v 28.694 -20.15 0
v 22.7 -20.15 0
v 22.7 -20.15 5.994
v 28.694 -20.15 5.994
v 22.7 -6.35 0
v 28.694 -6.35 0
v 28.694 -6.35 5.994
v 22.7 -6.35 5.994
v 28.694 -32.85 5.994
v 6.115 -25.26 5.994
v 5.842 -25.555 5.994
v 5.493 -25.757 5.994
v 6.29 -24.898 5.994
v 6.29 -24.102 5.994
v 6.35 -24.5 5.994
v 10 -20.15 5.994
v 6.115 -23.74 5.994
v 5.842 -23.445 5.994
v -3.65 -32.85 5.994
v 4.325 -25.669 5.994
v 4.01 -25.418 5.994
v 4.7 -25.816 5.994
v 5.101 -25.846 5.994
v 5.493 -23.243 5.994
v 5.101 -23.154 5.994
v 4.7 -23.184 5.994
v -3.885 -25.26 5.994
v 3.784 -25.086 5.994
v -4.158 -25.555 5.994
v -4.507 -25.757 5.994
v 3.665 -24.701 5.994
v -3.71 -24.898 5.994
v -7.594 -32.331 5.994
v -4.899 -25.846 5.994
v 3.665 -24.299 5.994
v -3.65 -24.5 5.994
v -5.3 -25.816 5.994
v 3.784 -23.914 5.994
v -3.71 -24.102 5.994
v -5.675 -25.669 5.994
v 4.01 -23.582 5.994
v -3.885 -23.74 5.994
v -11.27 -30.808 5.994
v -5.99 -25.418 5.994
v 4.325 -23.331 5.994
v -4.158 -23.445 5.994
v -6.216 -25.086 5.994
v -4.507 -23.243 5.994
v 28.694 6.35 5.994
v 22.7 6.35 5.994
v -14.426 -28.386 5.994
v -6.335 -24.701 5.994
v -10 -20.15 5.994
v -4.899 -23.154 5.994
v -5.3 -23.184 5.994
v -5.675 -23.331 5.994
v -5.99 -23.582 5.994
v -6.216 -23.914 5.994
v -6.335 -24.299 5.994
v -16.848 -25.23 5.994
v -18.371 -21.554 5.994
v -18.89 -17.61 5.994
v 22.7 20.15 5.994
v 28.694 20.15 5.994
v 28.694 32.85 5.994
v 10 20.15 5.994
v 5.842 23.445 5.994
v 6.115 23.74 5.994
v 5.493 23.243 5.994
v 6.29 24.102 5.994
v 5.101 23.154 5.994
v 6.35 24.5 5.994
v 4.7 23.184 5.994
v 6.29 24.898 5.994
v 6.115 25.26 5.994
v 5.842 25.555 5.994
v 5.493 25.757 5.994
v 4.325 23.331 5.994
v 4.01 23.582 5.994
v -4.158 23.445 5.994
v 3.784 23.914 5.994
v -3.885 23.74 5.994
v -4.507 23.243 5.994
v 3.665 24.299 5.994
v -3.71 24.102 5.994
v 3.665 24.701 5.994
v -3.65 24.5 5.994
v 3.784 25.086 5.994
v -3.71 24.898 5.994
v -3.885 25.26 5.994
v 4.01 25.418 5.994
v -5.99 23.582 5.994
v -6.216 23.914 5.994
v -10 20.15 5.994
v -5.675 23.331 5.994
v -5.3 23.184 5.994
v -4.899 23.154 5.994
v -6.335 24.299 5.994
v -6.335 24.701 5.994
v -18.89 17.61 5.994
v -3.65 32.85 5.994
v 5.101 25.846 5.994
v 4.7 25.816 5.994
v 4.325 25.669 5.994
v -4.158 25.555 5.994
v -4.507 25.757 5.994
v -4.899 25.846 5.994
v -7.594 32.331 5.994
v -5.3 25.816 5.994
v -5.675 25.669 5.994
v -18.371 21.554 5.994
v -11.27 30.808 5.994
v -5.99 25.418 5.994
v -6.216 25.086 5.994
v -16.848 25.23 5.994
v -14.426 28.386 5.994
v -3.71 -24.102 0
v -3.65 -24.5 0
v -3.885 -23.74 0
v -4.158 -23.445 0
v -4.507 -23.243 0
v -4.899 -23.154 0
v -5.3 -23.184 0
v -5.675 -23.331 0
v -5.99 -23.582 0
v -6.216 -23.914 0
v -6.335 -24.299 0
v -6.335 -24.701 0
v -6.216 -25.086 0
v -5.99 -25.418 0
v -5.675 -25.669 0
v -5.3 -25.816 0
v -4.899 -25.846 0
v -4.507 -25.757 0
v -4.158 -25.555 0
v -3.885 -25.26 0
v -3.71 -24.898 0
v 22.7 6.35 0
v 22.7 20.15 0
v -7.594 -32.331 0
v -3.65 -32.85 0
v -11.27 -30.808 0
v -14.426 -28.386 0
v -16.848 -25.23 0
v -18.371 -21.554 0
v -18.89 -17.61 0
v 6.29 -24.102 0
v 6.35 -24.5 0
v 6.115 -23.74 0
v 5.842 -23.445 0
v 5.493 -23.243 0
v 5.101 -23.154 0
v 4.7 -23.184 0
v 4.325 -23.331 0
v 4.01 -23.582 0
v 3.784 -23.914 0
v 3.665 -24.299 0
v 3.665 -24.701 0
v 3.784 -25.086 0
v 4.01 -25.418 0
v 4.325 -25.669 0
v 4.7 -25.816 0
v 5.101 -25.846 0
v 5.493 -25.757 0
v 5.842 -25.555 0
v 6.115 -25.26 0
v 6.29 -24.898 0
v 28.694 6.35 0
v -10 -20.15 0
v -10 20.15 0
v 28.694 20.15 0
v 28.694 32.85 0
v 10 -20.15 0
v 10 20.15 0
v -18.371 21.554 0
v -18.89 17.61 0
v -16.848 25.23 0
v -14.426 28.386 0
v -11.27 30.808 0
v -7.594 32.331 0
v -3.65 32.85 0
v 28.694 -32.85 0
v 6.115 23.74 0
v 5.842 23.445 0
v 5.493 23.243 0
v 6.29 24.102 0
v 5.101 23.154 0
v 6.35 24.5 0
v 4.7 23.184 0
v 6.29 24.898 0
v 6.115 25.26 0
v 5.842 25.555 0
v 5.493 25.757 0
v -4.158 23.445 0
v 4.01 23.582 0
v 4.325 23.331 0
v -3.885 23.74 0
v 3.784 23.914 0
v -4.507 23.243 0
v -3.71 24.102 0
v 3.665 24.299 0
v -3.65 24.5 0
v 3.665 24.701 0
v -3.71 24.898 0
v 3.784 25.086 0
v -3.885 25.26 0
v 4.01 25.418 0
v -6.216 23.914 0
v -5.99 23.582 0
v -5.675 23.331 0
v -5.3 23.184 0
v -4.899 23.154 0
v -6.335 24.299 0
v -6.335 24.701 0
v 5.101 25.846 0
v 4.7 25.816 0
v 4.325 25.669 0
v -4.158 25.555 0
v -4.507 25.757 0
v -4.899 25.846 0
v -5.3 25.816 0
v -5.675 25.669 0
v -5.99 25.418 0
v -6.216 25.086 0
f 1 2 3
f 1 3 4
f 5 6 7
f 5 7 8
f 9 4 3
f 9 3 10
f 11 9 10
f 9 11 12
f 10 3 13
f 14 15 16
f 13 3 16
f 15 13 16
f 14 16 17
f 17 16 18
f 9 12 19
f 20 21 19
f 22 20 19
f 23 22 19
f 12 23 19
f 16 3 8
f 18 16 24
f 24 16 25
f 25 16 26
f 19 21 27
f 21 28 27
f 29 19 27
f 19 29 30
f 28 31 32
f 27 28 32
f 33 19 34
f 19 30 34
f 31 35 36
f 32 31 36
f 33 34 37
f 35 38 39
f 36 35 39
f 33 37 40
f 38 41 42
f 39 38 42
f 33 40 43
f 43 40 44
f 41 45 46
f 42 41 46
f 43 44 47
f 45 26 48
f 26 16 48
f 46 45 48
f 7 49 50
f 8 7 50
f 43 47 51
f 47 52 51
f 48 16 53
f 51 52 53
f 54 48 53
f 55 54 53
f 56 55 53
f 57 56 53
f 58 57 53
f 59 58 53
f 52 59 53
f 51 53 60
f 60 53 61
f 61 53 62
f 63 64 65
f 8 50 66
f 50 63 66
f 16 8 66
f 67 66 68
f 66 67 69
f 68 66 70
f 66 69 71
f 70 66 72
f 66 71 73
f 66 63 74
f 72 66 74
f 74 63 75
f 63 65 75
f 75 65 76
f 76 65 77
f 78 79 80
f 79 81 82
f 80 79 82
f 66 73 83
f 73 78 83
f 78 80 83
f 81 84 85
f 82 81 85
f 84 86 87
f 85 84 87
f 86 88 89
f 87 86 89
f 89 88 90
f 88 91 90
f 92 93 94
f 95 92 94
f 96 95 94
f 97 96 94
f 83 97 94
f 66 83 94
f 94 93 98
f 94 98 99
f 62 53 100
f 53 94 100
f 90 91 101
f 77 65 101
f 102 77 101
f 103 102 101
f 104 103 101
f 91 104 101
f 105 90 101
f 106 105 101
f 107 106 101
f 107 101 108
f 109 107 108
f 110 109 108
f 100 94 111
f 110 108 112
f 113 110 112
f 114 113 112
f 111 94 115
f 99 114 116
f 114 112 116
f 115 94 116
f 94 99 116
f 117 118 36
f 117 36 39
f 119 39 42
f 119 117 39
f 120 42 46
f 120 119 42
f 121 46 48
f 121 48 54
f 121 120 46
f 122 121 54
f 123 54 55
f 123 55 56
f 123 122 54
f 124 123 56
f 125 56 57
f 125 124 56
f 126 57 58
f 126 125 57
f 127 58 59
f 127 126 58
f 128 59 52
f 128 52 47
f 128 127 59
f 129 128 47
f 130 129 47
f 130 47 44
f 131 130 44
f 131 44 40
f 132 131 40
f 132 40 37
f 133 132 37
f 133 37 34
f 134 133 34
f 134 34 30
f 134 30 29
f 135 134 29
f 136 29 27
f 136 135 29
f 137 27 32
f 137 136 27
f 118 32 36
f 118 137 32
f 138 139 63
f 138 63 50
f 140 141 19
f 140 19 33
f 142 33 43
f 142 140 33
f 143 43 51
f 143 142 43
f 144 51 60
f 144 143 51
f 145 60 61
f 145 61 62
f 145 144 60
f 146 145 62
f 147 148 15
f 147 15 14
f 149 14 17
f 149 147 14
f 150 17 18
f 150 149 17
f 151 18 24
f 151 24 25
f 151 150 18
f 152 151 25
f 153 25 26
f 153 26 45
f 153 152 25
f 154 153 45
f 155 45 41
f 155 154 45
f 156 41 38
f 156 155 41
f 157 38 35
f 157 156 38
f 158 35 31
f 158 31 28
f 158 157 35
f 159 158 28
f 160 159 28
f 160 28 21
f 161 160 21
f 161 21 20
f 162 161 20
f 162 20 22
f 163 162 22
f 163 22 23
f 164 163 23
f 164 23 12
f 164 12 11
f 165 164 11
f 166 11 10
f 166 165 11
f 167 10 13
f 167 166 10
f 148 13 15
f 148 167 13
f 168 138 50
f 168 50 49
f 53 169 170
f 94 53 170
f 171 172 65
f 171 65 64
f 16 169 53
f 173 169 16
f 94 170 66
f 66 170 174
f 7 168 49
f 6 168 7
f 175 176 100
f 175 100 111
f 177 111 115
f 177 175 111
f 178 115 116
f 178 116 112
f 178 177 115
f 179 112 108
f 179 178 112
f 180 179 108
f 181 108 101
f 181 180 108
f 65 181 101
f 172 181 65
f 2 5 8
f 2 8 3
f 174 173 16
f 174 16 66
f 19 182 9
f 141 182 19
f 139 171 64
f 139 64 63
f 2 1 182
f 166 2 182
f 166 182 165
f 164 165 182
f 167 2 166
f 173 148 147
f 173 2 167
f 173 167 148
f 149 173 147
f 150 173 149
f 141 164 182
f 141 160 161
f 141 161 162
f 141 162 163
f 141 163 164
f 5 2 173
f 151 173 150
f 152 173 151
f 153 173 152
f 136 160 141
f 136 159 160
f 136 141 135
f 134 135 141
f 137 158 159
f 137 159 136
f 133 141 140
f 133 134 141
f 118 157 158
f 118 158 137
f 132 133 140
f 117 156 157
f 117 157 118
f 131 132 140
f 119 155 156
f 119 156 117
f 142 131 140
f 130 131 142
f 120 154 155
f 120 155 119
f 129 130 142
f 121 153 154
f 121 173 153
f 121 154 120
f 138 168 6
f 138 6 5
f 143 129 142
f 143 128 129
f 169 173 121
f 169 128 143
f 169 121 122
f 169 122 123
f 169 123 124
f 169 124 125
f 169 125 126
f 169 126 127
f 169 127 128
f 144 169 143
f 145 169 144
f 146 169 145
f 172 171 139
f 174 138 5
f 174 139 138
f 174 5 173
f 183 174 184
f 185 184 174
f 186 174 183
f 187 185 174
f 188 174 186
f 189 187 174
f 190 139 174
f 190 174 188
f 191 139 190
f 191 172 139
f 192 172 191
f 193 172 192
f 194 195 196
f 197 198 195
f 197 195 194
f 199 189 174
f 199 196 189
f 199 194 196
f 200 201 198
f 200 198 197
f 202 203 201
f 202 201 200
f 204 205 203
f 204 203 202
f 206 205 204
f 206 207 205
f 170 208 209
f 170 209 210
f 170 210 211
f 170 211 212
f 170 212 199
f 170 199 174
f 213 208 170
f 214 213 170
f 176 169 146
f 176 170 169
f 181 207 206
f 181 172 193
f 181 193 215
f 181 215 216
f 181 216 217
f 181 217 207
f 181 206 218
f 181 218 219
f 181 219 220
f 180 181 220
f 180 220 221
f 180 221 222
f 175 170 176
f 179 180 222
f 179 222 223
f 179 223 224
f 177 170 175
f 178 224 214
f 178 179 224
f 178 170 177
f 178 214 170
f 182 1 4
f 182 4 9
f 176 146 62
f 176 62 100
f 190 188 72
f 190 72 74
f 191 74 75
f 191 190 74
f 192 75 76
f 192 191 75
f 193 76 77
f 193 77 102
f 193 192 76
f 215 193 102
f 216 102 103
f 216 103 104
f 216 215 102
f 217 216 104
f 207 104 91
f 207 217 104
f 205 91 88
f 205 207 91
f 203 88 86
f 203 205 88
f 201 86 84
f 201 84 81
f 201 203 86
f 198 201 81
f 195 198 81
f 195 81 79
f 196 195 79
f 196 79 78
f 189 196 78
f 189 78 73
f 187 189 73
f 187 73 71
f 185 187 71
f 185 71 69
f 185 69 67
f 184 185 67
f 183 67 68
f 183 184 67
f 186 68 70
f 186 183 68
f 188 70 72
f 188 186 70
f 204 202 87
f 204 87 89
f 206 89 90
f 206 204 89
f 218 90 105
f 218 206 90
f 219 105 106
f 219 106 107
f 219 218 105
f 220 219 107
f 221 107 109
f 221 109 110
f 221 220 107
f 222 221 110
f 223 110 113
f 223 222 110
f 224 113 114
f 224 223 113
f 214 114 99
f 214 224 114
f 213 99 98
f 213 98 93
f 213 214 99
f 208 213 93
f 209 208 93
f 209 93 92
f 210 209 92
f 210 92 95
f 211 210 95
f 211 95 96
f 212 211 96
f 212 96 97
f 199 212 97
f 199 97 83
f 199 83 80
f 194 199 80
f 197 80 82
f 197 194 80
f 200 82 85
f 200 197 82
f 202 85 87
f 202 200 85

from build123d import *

# Parameters (mm, degrees)
SKETCH1_R           = 1.35
SKETCH1_W           = 20
SKETCH1_H           = 40.3
BOSS_EXTRUDE1_DEPTH = 5.9944


with BuildPart() as part:
    # Sketch1 → Boss-Extrude1 (new body)
    with BuildSketch(Plane.XY):
        with BuildLine():
            ThreePointArc((-18.89, 17.61), (-14.426307345, 28.386307345), (-3.65, 32.85))
            Line((-3.65, 32.85), (10, 32.85))
            Line((10, 32.85), (22.7, 32.85))
            Line((22.7, 32.85), (28.6944, 32.85))
            Line((28.6944, 32.85), (28.6944, 20.15))
            Line((28.6944, 20.15), (22.7, 20.15))
            Line((22.7, 20.15), (22.7, 6.35))
            Line((22.7, 6.35), (28.6944, 6.35))
            Line((28.6944, 6.35), (28.6944, 0))
            Line((28.6944, 0), (28.6944, -6.35))
            Line((28.6944, -6.35), (22.7, -6.35))
            Line((22.7, -6.35), (22.7, -20.15))
            Line((22.7, -20.15), (28.6944, -20.15))
            Line((28.6944, -20.15), (28.6944, -32.85))
            Line((28.6944, -32.85), (22.7, -32.85))
            Line((22.7, -32.85), (-3.65, -32.85))
            ThreePointArc((-3.65, -32.85), (-14.426307345, -28.386307345), (-18.89, -17.61))
            Line((-18.89, -17.61), (-18.89, 17.61))
        make_face()
        with Locations((5, 24.5)):
            Circle(SKETCH1_R, mode=Mode.SUBTRACT)
        with Locations((-5, 24.5)):
            Circle(SKETCH1_R, mode=Mode.SUBTRACT)
        with Locations((5, -24.5)):
            Circle(SKETCH1_R, mode=Mode.SUBTRACT)
        with Locations((-5, -24.5)):
            Circle(SKETCH1_R, mode=Mode.SUBTRACT)
        Rectangle(SKETCH1_W, SKETCH1_H, mode=Mode.SUBTRACT)
    extrude(amount=BOSS_EXTRUDE1_DEPTH)


solid = part.part
